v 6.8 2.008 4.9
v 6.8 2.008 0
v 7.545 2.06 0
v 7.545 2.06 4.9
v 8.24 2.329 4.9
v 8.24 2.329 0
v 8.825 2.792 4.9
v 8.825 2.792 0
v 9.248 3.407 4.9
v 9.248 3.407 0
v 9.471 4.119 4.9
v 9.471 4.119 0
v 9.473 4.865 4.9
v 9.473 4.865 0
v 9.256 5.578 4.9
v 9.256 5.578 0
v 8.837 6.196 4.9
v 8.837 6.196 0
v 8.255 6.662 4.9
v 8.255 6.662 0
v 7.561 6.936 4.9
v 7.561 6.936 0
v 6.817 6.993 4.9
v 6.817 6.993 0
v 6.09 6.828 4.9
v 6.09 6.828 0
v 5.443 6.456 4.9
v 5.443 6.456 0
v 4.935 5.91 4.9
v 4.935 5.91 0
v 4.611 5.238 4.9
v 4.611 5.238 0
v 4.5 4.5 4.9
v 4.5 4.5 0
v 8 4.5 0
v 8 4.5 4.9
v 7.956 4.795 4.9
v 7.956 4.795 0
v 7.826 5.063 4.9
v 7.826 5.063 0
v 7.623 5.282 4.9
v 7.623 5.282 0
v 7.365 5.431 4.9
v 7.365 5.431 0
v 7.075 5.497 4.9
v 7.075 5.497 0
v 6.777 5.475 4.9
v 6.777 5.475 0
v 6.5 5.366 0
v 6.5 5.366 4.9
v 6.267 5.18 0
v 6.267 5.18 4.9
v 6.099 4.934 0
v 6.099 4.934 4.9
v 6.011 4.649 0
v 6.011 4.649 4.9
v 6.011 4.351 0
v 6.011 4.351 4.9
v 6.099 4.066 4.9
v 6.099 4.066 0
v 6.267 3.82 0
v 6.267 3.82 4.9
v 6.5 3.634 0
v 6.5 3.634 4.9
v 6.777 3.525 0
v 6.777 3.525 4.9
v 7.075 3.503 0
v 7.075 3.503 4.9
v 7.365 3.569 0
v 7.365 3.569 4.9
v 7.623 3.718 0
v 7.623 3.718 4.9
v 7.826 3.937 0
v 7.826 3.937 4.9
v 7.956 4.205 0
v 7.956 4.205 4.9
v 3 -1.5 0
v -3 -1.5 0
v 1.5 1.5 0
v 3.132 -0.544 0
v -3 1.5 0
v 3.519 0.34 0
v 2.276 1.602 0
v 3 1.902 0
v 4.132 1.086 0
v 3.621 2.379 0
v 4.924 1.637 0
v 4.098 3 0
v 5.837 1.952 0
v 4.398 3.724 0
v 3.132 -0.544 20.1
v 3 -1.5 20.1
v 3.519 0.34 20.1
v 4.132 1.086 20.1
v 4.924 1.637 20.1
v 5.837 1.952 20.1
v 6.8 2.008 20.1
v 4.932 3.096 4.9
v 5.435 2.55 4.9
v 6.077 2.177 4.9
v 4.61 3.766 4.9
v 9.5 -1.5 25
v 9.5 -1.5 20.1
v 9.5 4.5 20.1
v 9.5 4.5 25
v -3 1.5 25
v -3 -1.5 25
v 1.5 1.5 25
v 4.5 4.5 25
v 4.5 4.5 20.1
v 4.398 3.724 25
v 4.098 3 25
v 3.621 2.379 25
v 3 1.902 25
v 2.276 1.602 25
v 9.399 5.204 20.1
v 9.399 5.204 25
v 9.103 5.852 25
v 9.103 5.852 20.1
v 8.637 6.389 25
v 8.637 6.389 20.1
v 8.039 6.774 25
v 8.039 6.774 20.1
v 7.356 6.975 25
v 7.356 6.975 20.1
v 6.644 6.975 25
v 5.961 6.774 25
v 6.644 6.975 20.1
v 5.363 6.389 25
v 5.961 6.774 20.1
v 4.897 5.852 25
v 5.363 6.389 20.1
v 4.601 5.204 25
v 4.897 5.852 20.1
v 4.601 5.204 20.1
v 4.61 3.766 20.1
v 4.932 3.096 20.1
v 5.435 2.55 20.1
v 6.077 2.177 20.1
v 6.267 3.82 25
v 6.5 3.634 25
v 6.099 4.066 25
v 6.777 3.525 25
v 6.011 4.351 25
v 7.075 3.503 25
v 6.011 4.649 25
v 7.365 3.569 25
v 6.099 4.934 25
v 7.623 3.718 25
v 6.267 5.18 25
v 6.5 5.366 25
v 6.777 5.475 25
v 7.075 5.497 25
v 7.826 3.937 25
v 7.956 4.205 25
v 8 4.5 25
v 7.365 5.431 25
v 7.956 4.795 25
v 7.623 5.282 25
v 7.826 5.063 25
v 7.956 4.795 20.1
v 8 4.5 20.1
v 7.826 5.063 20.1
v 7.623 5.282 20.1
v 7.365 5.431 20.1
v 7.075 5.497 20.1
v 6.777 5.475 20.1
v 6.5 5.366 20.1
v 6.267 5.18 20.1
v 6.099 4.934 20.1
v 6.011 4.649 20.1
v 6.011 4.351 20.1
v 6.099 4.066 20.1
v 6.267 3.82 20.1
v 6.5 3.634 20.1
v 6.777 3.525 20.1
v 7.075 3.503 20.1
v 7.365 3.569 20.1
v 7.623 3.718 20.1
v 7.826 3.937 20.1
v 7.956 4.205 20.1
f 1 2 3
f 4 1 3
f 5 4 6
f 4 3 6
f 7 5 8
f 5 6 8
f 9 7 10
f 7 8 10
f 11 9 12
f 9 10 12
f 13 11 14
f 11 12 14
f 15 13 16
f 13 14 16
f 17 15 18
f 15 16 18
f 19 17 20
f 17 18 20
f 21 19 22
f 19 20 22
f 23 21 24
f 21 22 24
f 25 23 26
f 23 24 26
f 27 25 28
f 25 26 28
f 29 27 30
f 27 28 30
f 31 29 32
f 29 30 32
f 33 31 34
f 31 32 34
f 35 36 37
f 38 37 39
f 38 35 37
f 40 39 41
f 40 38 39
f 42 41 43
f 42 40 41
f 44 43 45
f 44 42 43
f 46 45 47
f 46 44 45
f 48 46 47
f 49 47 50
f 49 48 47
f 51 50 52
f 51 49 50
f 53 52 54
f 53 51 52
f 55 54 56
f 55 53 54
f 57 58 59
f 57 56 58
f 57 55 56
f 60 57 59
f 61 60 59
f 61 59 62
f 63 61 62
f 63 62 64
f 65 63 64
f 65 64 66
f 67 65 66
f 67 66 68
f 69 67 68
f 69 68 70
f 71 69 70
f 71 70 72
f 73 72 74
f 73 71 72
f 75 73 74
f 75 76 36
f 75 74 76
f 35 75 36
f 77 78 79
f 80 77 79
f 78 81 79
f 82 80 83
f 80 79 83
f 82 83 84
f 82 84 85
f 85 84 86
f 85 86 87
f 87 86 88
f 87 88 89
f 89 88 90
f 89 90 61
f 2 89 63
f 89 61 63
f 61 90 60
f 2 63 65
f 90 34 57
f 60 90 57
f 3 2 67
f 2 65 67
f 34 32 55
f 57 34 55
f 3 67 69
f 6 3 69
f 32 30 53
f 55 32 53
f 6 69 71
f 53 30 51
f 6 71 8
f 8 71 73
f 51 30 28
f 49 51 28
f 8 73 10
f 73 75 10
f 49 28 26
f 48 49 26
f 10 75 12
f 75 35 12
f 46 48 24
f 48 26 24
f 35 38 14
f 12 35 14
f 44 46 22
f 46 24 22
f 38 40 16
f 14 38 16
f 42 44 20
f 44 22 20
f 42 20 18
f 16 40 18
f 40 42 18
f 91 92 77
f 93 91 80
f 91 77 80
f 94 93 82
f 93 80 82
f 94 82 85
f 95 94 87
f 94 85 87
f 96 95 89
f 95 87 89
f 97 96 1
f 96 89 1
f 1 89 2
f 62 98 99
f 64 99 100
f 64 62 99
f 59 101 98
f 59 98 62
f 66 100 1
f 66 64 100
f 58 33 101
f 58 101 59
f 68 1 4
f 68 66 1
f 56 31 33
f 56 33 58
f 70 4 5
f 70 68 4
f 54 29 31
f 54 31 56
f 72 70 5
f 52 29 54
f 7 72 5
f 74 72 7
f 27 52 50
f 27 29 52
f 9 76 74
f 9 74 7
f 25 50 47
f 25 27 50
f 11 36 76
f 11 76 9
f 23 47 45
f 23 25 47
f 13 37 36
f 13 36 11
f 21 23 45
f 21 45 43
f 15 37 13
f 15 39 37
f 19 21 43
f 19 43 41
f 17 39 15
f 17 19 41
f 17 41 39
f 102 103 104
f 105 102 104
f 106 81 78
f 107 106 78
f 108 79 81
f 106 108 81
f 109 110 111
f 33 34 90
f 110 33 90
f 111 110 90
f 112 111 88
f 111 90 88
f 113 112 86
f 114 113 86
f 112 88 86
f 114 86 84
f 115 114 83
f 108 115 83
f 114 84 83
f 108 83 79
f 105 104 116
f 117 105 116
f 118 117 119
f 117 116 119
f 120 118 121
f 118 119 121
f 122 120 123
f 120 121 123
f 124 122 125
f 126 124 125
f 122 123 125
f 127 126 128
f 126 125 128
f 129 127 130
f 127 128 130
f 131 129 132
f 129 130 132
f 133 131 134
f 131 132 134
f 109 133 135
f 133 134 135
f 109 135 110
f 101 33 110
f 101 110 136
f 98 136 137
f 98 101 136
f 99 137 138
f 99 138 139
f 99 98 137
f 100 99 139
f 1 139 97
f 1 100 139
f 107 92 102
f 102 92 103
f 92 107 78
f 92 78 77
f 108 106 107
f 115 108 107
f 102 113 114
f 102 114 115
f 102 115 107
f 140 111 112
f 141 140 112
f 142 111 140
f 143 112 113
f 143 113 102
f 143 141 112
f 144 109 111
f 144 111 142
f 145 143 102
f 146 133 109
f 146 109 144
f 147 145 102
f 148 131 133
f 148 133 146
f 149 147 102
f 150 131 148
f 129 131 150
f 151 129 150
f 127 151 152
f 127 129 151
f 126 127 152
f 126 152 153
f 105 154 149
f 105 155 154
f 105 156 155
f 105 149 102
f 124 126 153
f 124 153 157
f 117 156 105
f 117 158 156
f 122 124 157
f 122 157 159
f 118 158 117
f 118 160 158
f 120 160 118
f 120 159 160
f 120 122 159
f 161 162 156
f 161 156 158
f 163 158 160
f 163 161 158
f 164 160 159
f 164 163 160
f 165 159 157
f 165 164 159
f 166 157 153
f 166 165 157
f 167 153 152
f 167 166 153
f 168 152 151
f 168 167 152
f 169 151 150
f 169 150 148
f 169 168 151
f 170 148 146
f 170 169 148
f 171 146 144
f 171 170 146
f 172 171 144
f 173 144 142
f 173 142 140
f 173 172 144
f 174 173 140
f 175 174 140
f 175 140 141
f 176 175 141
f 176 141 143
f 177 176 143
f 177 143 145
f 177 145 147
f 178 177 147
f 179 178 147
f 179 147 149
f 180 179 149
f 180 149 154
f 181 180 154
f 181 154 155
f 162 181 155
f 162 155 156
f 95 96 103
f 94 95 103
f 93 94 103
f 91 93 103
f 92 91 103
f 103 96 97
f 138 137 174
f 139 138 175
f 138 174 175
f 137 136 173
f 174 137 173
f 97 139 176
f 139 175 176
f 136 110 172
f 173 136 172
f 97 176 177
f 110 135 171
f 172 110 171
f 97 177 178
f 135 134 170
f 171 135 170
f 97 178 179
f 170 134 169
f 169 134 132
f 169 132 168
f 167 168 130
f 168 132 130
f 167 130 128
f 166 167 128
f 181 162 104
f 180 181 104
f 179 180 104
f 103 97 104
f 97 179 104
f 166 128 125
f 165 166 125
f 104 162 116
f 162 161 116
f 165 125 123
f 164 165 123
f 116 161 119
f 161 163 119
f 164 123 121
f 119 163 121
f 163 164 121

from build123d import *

# Parameters (mm, degrees)
SKETCH1_R           = 1
BOSS_EXTRUDE1_DEPTH = 25
CUT_EXTRUDE1_START  = -20.1
SKETCH2_R           = 2.5
CUT_EXTRUDE1_DEPTH  = 15.2
BOSS_EXTRUDE2_START = -4.9
BOSS_EXTRUDE2_DEPTH = 4.9


with BuildPart() as part:
    # Sketch1 → Boss-Extrude1 (new body)
    with BuildSketch(Plane.XY):
        with BuildLine():
            Line((-3, -1.5), (3, -1.5))
            ThreePointArc((3, -1.5), (4.132206562, 1.085942892), (6.800319489, 2.00798722))
            ThreePointArc((6.800319489, 2.00798722), (8.837008612, 6.195700257), (4.5, 4.5))
            ThreePointArc((4.5, 4.5), (3.621320344, 2.378679656), (1.5, 1.5))
            Line((1.5, 1.5), (-3, 1.5))
            Line((-3, 1.5), (-3, -1.5))
        make_face()
        with Locations((7, 4.5)):
            Circle(SKETCH1_R, mode=Mode.SUBTRACT)
    extrude(amount=BOSS_EXTRUDE1_DEPTH)

    # Sketch2 → Cut-Extrude1 (cut)
    with BuildSketch(Plane.XY.offset(25).offset(CUT_EXTRUDE1_START)):
        with Locations((7, 4.5)):
            Circle(SKETCH2_R)
    extrude(amount=CUT_EXTRUDE1_DEPTH, mode=Mode.SUBTRACT)

    # Sketch4 → Boss-Extrude2 (add)
    with BuildSketch(Plane.XY.offset(25).offset(BOSS_EXTRUDE2_START)):
        with BuildLine():
            Line((3, -1.5), (9.5, -1.5))
            Line((9.5, -1.5), (9.5, 4.5))
            ThreePointArc((9.5, 4.5), (8.695700257, 2.662991388), (6.800319489, 2.00798722))
            ThreePointArc((6.800319489, 2.00798722), (4.132206562, 1.085942892), (3, -1.5))
        make_face()
    extrude(amount=BOSS_EXTRUDE2_DEPTH)


solid = part.part
